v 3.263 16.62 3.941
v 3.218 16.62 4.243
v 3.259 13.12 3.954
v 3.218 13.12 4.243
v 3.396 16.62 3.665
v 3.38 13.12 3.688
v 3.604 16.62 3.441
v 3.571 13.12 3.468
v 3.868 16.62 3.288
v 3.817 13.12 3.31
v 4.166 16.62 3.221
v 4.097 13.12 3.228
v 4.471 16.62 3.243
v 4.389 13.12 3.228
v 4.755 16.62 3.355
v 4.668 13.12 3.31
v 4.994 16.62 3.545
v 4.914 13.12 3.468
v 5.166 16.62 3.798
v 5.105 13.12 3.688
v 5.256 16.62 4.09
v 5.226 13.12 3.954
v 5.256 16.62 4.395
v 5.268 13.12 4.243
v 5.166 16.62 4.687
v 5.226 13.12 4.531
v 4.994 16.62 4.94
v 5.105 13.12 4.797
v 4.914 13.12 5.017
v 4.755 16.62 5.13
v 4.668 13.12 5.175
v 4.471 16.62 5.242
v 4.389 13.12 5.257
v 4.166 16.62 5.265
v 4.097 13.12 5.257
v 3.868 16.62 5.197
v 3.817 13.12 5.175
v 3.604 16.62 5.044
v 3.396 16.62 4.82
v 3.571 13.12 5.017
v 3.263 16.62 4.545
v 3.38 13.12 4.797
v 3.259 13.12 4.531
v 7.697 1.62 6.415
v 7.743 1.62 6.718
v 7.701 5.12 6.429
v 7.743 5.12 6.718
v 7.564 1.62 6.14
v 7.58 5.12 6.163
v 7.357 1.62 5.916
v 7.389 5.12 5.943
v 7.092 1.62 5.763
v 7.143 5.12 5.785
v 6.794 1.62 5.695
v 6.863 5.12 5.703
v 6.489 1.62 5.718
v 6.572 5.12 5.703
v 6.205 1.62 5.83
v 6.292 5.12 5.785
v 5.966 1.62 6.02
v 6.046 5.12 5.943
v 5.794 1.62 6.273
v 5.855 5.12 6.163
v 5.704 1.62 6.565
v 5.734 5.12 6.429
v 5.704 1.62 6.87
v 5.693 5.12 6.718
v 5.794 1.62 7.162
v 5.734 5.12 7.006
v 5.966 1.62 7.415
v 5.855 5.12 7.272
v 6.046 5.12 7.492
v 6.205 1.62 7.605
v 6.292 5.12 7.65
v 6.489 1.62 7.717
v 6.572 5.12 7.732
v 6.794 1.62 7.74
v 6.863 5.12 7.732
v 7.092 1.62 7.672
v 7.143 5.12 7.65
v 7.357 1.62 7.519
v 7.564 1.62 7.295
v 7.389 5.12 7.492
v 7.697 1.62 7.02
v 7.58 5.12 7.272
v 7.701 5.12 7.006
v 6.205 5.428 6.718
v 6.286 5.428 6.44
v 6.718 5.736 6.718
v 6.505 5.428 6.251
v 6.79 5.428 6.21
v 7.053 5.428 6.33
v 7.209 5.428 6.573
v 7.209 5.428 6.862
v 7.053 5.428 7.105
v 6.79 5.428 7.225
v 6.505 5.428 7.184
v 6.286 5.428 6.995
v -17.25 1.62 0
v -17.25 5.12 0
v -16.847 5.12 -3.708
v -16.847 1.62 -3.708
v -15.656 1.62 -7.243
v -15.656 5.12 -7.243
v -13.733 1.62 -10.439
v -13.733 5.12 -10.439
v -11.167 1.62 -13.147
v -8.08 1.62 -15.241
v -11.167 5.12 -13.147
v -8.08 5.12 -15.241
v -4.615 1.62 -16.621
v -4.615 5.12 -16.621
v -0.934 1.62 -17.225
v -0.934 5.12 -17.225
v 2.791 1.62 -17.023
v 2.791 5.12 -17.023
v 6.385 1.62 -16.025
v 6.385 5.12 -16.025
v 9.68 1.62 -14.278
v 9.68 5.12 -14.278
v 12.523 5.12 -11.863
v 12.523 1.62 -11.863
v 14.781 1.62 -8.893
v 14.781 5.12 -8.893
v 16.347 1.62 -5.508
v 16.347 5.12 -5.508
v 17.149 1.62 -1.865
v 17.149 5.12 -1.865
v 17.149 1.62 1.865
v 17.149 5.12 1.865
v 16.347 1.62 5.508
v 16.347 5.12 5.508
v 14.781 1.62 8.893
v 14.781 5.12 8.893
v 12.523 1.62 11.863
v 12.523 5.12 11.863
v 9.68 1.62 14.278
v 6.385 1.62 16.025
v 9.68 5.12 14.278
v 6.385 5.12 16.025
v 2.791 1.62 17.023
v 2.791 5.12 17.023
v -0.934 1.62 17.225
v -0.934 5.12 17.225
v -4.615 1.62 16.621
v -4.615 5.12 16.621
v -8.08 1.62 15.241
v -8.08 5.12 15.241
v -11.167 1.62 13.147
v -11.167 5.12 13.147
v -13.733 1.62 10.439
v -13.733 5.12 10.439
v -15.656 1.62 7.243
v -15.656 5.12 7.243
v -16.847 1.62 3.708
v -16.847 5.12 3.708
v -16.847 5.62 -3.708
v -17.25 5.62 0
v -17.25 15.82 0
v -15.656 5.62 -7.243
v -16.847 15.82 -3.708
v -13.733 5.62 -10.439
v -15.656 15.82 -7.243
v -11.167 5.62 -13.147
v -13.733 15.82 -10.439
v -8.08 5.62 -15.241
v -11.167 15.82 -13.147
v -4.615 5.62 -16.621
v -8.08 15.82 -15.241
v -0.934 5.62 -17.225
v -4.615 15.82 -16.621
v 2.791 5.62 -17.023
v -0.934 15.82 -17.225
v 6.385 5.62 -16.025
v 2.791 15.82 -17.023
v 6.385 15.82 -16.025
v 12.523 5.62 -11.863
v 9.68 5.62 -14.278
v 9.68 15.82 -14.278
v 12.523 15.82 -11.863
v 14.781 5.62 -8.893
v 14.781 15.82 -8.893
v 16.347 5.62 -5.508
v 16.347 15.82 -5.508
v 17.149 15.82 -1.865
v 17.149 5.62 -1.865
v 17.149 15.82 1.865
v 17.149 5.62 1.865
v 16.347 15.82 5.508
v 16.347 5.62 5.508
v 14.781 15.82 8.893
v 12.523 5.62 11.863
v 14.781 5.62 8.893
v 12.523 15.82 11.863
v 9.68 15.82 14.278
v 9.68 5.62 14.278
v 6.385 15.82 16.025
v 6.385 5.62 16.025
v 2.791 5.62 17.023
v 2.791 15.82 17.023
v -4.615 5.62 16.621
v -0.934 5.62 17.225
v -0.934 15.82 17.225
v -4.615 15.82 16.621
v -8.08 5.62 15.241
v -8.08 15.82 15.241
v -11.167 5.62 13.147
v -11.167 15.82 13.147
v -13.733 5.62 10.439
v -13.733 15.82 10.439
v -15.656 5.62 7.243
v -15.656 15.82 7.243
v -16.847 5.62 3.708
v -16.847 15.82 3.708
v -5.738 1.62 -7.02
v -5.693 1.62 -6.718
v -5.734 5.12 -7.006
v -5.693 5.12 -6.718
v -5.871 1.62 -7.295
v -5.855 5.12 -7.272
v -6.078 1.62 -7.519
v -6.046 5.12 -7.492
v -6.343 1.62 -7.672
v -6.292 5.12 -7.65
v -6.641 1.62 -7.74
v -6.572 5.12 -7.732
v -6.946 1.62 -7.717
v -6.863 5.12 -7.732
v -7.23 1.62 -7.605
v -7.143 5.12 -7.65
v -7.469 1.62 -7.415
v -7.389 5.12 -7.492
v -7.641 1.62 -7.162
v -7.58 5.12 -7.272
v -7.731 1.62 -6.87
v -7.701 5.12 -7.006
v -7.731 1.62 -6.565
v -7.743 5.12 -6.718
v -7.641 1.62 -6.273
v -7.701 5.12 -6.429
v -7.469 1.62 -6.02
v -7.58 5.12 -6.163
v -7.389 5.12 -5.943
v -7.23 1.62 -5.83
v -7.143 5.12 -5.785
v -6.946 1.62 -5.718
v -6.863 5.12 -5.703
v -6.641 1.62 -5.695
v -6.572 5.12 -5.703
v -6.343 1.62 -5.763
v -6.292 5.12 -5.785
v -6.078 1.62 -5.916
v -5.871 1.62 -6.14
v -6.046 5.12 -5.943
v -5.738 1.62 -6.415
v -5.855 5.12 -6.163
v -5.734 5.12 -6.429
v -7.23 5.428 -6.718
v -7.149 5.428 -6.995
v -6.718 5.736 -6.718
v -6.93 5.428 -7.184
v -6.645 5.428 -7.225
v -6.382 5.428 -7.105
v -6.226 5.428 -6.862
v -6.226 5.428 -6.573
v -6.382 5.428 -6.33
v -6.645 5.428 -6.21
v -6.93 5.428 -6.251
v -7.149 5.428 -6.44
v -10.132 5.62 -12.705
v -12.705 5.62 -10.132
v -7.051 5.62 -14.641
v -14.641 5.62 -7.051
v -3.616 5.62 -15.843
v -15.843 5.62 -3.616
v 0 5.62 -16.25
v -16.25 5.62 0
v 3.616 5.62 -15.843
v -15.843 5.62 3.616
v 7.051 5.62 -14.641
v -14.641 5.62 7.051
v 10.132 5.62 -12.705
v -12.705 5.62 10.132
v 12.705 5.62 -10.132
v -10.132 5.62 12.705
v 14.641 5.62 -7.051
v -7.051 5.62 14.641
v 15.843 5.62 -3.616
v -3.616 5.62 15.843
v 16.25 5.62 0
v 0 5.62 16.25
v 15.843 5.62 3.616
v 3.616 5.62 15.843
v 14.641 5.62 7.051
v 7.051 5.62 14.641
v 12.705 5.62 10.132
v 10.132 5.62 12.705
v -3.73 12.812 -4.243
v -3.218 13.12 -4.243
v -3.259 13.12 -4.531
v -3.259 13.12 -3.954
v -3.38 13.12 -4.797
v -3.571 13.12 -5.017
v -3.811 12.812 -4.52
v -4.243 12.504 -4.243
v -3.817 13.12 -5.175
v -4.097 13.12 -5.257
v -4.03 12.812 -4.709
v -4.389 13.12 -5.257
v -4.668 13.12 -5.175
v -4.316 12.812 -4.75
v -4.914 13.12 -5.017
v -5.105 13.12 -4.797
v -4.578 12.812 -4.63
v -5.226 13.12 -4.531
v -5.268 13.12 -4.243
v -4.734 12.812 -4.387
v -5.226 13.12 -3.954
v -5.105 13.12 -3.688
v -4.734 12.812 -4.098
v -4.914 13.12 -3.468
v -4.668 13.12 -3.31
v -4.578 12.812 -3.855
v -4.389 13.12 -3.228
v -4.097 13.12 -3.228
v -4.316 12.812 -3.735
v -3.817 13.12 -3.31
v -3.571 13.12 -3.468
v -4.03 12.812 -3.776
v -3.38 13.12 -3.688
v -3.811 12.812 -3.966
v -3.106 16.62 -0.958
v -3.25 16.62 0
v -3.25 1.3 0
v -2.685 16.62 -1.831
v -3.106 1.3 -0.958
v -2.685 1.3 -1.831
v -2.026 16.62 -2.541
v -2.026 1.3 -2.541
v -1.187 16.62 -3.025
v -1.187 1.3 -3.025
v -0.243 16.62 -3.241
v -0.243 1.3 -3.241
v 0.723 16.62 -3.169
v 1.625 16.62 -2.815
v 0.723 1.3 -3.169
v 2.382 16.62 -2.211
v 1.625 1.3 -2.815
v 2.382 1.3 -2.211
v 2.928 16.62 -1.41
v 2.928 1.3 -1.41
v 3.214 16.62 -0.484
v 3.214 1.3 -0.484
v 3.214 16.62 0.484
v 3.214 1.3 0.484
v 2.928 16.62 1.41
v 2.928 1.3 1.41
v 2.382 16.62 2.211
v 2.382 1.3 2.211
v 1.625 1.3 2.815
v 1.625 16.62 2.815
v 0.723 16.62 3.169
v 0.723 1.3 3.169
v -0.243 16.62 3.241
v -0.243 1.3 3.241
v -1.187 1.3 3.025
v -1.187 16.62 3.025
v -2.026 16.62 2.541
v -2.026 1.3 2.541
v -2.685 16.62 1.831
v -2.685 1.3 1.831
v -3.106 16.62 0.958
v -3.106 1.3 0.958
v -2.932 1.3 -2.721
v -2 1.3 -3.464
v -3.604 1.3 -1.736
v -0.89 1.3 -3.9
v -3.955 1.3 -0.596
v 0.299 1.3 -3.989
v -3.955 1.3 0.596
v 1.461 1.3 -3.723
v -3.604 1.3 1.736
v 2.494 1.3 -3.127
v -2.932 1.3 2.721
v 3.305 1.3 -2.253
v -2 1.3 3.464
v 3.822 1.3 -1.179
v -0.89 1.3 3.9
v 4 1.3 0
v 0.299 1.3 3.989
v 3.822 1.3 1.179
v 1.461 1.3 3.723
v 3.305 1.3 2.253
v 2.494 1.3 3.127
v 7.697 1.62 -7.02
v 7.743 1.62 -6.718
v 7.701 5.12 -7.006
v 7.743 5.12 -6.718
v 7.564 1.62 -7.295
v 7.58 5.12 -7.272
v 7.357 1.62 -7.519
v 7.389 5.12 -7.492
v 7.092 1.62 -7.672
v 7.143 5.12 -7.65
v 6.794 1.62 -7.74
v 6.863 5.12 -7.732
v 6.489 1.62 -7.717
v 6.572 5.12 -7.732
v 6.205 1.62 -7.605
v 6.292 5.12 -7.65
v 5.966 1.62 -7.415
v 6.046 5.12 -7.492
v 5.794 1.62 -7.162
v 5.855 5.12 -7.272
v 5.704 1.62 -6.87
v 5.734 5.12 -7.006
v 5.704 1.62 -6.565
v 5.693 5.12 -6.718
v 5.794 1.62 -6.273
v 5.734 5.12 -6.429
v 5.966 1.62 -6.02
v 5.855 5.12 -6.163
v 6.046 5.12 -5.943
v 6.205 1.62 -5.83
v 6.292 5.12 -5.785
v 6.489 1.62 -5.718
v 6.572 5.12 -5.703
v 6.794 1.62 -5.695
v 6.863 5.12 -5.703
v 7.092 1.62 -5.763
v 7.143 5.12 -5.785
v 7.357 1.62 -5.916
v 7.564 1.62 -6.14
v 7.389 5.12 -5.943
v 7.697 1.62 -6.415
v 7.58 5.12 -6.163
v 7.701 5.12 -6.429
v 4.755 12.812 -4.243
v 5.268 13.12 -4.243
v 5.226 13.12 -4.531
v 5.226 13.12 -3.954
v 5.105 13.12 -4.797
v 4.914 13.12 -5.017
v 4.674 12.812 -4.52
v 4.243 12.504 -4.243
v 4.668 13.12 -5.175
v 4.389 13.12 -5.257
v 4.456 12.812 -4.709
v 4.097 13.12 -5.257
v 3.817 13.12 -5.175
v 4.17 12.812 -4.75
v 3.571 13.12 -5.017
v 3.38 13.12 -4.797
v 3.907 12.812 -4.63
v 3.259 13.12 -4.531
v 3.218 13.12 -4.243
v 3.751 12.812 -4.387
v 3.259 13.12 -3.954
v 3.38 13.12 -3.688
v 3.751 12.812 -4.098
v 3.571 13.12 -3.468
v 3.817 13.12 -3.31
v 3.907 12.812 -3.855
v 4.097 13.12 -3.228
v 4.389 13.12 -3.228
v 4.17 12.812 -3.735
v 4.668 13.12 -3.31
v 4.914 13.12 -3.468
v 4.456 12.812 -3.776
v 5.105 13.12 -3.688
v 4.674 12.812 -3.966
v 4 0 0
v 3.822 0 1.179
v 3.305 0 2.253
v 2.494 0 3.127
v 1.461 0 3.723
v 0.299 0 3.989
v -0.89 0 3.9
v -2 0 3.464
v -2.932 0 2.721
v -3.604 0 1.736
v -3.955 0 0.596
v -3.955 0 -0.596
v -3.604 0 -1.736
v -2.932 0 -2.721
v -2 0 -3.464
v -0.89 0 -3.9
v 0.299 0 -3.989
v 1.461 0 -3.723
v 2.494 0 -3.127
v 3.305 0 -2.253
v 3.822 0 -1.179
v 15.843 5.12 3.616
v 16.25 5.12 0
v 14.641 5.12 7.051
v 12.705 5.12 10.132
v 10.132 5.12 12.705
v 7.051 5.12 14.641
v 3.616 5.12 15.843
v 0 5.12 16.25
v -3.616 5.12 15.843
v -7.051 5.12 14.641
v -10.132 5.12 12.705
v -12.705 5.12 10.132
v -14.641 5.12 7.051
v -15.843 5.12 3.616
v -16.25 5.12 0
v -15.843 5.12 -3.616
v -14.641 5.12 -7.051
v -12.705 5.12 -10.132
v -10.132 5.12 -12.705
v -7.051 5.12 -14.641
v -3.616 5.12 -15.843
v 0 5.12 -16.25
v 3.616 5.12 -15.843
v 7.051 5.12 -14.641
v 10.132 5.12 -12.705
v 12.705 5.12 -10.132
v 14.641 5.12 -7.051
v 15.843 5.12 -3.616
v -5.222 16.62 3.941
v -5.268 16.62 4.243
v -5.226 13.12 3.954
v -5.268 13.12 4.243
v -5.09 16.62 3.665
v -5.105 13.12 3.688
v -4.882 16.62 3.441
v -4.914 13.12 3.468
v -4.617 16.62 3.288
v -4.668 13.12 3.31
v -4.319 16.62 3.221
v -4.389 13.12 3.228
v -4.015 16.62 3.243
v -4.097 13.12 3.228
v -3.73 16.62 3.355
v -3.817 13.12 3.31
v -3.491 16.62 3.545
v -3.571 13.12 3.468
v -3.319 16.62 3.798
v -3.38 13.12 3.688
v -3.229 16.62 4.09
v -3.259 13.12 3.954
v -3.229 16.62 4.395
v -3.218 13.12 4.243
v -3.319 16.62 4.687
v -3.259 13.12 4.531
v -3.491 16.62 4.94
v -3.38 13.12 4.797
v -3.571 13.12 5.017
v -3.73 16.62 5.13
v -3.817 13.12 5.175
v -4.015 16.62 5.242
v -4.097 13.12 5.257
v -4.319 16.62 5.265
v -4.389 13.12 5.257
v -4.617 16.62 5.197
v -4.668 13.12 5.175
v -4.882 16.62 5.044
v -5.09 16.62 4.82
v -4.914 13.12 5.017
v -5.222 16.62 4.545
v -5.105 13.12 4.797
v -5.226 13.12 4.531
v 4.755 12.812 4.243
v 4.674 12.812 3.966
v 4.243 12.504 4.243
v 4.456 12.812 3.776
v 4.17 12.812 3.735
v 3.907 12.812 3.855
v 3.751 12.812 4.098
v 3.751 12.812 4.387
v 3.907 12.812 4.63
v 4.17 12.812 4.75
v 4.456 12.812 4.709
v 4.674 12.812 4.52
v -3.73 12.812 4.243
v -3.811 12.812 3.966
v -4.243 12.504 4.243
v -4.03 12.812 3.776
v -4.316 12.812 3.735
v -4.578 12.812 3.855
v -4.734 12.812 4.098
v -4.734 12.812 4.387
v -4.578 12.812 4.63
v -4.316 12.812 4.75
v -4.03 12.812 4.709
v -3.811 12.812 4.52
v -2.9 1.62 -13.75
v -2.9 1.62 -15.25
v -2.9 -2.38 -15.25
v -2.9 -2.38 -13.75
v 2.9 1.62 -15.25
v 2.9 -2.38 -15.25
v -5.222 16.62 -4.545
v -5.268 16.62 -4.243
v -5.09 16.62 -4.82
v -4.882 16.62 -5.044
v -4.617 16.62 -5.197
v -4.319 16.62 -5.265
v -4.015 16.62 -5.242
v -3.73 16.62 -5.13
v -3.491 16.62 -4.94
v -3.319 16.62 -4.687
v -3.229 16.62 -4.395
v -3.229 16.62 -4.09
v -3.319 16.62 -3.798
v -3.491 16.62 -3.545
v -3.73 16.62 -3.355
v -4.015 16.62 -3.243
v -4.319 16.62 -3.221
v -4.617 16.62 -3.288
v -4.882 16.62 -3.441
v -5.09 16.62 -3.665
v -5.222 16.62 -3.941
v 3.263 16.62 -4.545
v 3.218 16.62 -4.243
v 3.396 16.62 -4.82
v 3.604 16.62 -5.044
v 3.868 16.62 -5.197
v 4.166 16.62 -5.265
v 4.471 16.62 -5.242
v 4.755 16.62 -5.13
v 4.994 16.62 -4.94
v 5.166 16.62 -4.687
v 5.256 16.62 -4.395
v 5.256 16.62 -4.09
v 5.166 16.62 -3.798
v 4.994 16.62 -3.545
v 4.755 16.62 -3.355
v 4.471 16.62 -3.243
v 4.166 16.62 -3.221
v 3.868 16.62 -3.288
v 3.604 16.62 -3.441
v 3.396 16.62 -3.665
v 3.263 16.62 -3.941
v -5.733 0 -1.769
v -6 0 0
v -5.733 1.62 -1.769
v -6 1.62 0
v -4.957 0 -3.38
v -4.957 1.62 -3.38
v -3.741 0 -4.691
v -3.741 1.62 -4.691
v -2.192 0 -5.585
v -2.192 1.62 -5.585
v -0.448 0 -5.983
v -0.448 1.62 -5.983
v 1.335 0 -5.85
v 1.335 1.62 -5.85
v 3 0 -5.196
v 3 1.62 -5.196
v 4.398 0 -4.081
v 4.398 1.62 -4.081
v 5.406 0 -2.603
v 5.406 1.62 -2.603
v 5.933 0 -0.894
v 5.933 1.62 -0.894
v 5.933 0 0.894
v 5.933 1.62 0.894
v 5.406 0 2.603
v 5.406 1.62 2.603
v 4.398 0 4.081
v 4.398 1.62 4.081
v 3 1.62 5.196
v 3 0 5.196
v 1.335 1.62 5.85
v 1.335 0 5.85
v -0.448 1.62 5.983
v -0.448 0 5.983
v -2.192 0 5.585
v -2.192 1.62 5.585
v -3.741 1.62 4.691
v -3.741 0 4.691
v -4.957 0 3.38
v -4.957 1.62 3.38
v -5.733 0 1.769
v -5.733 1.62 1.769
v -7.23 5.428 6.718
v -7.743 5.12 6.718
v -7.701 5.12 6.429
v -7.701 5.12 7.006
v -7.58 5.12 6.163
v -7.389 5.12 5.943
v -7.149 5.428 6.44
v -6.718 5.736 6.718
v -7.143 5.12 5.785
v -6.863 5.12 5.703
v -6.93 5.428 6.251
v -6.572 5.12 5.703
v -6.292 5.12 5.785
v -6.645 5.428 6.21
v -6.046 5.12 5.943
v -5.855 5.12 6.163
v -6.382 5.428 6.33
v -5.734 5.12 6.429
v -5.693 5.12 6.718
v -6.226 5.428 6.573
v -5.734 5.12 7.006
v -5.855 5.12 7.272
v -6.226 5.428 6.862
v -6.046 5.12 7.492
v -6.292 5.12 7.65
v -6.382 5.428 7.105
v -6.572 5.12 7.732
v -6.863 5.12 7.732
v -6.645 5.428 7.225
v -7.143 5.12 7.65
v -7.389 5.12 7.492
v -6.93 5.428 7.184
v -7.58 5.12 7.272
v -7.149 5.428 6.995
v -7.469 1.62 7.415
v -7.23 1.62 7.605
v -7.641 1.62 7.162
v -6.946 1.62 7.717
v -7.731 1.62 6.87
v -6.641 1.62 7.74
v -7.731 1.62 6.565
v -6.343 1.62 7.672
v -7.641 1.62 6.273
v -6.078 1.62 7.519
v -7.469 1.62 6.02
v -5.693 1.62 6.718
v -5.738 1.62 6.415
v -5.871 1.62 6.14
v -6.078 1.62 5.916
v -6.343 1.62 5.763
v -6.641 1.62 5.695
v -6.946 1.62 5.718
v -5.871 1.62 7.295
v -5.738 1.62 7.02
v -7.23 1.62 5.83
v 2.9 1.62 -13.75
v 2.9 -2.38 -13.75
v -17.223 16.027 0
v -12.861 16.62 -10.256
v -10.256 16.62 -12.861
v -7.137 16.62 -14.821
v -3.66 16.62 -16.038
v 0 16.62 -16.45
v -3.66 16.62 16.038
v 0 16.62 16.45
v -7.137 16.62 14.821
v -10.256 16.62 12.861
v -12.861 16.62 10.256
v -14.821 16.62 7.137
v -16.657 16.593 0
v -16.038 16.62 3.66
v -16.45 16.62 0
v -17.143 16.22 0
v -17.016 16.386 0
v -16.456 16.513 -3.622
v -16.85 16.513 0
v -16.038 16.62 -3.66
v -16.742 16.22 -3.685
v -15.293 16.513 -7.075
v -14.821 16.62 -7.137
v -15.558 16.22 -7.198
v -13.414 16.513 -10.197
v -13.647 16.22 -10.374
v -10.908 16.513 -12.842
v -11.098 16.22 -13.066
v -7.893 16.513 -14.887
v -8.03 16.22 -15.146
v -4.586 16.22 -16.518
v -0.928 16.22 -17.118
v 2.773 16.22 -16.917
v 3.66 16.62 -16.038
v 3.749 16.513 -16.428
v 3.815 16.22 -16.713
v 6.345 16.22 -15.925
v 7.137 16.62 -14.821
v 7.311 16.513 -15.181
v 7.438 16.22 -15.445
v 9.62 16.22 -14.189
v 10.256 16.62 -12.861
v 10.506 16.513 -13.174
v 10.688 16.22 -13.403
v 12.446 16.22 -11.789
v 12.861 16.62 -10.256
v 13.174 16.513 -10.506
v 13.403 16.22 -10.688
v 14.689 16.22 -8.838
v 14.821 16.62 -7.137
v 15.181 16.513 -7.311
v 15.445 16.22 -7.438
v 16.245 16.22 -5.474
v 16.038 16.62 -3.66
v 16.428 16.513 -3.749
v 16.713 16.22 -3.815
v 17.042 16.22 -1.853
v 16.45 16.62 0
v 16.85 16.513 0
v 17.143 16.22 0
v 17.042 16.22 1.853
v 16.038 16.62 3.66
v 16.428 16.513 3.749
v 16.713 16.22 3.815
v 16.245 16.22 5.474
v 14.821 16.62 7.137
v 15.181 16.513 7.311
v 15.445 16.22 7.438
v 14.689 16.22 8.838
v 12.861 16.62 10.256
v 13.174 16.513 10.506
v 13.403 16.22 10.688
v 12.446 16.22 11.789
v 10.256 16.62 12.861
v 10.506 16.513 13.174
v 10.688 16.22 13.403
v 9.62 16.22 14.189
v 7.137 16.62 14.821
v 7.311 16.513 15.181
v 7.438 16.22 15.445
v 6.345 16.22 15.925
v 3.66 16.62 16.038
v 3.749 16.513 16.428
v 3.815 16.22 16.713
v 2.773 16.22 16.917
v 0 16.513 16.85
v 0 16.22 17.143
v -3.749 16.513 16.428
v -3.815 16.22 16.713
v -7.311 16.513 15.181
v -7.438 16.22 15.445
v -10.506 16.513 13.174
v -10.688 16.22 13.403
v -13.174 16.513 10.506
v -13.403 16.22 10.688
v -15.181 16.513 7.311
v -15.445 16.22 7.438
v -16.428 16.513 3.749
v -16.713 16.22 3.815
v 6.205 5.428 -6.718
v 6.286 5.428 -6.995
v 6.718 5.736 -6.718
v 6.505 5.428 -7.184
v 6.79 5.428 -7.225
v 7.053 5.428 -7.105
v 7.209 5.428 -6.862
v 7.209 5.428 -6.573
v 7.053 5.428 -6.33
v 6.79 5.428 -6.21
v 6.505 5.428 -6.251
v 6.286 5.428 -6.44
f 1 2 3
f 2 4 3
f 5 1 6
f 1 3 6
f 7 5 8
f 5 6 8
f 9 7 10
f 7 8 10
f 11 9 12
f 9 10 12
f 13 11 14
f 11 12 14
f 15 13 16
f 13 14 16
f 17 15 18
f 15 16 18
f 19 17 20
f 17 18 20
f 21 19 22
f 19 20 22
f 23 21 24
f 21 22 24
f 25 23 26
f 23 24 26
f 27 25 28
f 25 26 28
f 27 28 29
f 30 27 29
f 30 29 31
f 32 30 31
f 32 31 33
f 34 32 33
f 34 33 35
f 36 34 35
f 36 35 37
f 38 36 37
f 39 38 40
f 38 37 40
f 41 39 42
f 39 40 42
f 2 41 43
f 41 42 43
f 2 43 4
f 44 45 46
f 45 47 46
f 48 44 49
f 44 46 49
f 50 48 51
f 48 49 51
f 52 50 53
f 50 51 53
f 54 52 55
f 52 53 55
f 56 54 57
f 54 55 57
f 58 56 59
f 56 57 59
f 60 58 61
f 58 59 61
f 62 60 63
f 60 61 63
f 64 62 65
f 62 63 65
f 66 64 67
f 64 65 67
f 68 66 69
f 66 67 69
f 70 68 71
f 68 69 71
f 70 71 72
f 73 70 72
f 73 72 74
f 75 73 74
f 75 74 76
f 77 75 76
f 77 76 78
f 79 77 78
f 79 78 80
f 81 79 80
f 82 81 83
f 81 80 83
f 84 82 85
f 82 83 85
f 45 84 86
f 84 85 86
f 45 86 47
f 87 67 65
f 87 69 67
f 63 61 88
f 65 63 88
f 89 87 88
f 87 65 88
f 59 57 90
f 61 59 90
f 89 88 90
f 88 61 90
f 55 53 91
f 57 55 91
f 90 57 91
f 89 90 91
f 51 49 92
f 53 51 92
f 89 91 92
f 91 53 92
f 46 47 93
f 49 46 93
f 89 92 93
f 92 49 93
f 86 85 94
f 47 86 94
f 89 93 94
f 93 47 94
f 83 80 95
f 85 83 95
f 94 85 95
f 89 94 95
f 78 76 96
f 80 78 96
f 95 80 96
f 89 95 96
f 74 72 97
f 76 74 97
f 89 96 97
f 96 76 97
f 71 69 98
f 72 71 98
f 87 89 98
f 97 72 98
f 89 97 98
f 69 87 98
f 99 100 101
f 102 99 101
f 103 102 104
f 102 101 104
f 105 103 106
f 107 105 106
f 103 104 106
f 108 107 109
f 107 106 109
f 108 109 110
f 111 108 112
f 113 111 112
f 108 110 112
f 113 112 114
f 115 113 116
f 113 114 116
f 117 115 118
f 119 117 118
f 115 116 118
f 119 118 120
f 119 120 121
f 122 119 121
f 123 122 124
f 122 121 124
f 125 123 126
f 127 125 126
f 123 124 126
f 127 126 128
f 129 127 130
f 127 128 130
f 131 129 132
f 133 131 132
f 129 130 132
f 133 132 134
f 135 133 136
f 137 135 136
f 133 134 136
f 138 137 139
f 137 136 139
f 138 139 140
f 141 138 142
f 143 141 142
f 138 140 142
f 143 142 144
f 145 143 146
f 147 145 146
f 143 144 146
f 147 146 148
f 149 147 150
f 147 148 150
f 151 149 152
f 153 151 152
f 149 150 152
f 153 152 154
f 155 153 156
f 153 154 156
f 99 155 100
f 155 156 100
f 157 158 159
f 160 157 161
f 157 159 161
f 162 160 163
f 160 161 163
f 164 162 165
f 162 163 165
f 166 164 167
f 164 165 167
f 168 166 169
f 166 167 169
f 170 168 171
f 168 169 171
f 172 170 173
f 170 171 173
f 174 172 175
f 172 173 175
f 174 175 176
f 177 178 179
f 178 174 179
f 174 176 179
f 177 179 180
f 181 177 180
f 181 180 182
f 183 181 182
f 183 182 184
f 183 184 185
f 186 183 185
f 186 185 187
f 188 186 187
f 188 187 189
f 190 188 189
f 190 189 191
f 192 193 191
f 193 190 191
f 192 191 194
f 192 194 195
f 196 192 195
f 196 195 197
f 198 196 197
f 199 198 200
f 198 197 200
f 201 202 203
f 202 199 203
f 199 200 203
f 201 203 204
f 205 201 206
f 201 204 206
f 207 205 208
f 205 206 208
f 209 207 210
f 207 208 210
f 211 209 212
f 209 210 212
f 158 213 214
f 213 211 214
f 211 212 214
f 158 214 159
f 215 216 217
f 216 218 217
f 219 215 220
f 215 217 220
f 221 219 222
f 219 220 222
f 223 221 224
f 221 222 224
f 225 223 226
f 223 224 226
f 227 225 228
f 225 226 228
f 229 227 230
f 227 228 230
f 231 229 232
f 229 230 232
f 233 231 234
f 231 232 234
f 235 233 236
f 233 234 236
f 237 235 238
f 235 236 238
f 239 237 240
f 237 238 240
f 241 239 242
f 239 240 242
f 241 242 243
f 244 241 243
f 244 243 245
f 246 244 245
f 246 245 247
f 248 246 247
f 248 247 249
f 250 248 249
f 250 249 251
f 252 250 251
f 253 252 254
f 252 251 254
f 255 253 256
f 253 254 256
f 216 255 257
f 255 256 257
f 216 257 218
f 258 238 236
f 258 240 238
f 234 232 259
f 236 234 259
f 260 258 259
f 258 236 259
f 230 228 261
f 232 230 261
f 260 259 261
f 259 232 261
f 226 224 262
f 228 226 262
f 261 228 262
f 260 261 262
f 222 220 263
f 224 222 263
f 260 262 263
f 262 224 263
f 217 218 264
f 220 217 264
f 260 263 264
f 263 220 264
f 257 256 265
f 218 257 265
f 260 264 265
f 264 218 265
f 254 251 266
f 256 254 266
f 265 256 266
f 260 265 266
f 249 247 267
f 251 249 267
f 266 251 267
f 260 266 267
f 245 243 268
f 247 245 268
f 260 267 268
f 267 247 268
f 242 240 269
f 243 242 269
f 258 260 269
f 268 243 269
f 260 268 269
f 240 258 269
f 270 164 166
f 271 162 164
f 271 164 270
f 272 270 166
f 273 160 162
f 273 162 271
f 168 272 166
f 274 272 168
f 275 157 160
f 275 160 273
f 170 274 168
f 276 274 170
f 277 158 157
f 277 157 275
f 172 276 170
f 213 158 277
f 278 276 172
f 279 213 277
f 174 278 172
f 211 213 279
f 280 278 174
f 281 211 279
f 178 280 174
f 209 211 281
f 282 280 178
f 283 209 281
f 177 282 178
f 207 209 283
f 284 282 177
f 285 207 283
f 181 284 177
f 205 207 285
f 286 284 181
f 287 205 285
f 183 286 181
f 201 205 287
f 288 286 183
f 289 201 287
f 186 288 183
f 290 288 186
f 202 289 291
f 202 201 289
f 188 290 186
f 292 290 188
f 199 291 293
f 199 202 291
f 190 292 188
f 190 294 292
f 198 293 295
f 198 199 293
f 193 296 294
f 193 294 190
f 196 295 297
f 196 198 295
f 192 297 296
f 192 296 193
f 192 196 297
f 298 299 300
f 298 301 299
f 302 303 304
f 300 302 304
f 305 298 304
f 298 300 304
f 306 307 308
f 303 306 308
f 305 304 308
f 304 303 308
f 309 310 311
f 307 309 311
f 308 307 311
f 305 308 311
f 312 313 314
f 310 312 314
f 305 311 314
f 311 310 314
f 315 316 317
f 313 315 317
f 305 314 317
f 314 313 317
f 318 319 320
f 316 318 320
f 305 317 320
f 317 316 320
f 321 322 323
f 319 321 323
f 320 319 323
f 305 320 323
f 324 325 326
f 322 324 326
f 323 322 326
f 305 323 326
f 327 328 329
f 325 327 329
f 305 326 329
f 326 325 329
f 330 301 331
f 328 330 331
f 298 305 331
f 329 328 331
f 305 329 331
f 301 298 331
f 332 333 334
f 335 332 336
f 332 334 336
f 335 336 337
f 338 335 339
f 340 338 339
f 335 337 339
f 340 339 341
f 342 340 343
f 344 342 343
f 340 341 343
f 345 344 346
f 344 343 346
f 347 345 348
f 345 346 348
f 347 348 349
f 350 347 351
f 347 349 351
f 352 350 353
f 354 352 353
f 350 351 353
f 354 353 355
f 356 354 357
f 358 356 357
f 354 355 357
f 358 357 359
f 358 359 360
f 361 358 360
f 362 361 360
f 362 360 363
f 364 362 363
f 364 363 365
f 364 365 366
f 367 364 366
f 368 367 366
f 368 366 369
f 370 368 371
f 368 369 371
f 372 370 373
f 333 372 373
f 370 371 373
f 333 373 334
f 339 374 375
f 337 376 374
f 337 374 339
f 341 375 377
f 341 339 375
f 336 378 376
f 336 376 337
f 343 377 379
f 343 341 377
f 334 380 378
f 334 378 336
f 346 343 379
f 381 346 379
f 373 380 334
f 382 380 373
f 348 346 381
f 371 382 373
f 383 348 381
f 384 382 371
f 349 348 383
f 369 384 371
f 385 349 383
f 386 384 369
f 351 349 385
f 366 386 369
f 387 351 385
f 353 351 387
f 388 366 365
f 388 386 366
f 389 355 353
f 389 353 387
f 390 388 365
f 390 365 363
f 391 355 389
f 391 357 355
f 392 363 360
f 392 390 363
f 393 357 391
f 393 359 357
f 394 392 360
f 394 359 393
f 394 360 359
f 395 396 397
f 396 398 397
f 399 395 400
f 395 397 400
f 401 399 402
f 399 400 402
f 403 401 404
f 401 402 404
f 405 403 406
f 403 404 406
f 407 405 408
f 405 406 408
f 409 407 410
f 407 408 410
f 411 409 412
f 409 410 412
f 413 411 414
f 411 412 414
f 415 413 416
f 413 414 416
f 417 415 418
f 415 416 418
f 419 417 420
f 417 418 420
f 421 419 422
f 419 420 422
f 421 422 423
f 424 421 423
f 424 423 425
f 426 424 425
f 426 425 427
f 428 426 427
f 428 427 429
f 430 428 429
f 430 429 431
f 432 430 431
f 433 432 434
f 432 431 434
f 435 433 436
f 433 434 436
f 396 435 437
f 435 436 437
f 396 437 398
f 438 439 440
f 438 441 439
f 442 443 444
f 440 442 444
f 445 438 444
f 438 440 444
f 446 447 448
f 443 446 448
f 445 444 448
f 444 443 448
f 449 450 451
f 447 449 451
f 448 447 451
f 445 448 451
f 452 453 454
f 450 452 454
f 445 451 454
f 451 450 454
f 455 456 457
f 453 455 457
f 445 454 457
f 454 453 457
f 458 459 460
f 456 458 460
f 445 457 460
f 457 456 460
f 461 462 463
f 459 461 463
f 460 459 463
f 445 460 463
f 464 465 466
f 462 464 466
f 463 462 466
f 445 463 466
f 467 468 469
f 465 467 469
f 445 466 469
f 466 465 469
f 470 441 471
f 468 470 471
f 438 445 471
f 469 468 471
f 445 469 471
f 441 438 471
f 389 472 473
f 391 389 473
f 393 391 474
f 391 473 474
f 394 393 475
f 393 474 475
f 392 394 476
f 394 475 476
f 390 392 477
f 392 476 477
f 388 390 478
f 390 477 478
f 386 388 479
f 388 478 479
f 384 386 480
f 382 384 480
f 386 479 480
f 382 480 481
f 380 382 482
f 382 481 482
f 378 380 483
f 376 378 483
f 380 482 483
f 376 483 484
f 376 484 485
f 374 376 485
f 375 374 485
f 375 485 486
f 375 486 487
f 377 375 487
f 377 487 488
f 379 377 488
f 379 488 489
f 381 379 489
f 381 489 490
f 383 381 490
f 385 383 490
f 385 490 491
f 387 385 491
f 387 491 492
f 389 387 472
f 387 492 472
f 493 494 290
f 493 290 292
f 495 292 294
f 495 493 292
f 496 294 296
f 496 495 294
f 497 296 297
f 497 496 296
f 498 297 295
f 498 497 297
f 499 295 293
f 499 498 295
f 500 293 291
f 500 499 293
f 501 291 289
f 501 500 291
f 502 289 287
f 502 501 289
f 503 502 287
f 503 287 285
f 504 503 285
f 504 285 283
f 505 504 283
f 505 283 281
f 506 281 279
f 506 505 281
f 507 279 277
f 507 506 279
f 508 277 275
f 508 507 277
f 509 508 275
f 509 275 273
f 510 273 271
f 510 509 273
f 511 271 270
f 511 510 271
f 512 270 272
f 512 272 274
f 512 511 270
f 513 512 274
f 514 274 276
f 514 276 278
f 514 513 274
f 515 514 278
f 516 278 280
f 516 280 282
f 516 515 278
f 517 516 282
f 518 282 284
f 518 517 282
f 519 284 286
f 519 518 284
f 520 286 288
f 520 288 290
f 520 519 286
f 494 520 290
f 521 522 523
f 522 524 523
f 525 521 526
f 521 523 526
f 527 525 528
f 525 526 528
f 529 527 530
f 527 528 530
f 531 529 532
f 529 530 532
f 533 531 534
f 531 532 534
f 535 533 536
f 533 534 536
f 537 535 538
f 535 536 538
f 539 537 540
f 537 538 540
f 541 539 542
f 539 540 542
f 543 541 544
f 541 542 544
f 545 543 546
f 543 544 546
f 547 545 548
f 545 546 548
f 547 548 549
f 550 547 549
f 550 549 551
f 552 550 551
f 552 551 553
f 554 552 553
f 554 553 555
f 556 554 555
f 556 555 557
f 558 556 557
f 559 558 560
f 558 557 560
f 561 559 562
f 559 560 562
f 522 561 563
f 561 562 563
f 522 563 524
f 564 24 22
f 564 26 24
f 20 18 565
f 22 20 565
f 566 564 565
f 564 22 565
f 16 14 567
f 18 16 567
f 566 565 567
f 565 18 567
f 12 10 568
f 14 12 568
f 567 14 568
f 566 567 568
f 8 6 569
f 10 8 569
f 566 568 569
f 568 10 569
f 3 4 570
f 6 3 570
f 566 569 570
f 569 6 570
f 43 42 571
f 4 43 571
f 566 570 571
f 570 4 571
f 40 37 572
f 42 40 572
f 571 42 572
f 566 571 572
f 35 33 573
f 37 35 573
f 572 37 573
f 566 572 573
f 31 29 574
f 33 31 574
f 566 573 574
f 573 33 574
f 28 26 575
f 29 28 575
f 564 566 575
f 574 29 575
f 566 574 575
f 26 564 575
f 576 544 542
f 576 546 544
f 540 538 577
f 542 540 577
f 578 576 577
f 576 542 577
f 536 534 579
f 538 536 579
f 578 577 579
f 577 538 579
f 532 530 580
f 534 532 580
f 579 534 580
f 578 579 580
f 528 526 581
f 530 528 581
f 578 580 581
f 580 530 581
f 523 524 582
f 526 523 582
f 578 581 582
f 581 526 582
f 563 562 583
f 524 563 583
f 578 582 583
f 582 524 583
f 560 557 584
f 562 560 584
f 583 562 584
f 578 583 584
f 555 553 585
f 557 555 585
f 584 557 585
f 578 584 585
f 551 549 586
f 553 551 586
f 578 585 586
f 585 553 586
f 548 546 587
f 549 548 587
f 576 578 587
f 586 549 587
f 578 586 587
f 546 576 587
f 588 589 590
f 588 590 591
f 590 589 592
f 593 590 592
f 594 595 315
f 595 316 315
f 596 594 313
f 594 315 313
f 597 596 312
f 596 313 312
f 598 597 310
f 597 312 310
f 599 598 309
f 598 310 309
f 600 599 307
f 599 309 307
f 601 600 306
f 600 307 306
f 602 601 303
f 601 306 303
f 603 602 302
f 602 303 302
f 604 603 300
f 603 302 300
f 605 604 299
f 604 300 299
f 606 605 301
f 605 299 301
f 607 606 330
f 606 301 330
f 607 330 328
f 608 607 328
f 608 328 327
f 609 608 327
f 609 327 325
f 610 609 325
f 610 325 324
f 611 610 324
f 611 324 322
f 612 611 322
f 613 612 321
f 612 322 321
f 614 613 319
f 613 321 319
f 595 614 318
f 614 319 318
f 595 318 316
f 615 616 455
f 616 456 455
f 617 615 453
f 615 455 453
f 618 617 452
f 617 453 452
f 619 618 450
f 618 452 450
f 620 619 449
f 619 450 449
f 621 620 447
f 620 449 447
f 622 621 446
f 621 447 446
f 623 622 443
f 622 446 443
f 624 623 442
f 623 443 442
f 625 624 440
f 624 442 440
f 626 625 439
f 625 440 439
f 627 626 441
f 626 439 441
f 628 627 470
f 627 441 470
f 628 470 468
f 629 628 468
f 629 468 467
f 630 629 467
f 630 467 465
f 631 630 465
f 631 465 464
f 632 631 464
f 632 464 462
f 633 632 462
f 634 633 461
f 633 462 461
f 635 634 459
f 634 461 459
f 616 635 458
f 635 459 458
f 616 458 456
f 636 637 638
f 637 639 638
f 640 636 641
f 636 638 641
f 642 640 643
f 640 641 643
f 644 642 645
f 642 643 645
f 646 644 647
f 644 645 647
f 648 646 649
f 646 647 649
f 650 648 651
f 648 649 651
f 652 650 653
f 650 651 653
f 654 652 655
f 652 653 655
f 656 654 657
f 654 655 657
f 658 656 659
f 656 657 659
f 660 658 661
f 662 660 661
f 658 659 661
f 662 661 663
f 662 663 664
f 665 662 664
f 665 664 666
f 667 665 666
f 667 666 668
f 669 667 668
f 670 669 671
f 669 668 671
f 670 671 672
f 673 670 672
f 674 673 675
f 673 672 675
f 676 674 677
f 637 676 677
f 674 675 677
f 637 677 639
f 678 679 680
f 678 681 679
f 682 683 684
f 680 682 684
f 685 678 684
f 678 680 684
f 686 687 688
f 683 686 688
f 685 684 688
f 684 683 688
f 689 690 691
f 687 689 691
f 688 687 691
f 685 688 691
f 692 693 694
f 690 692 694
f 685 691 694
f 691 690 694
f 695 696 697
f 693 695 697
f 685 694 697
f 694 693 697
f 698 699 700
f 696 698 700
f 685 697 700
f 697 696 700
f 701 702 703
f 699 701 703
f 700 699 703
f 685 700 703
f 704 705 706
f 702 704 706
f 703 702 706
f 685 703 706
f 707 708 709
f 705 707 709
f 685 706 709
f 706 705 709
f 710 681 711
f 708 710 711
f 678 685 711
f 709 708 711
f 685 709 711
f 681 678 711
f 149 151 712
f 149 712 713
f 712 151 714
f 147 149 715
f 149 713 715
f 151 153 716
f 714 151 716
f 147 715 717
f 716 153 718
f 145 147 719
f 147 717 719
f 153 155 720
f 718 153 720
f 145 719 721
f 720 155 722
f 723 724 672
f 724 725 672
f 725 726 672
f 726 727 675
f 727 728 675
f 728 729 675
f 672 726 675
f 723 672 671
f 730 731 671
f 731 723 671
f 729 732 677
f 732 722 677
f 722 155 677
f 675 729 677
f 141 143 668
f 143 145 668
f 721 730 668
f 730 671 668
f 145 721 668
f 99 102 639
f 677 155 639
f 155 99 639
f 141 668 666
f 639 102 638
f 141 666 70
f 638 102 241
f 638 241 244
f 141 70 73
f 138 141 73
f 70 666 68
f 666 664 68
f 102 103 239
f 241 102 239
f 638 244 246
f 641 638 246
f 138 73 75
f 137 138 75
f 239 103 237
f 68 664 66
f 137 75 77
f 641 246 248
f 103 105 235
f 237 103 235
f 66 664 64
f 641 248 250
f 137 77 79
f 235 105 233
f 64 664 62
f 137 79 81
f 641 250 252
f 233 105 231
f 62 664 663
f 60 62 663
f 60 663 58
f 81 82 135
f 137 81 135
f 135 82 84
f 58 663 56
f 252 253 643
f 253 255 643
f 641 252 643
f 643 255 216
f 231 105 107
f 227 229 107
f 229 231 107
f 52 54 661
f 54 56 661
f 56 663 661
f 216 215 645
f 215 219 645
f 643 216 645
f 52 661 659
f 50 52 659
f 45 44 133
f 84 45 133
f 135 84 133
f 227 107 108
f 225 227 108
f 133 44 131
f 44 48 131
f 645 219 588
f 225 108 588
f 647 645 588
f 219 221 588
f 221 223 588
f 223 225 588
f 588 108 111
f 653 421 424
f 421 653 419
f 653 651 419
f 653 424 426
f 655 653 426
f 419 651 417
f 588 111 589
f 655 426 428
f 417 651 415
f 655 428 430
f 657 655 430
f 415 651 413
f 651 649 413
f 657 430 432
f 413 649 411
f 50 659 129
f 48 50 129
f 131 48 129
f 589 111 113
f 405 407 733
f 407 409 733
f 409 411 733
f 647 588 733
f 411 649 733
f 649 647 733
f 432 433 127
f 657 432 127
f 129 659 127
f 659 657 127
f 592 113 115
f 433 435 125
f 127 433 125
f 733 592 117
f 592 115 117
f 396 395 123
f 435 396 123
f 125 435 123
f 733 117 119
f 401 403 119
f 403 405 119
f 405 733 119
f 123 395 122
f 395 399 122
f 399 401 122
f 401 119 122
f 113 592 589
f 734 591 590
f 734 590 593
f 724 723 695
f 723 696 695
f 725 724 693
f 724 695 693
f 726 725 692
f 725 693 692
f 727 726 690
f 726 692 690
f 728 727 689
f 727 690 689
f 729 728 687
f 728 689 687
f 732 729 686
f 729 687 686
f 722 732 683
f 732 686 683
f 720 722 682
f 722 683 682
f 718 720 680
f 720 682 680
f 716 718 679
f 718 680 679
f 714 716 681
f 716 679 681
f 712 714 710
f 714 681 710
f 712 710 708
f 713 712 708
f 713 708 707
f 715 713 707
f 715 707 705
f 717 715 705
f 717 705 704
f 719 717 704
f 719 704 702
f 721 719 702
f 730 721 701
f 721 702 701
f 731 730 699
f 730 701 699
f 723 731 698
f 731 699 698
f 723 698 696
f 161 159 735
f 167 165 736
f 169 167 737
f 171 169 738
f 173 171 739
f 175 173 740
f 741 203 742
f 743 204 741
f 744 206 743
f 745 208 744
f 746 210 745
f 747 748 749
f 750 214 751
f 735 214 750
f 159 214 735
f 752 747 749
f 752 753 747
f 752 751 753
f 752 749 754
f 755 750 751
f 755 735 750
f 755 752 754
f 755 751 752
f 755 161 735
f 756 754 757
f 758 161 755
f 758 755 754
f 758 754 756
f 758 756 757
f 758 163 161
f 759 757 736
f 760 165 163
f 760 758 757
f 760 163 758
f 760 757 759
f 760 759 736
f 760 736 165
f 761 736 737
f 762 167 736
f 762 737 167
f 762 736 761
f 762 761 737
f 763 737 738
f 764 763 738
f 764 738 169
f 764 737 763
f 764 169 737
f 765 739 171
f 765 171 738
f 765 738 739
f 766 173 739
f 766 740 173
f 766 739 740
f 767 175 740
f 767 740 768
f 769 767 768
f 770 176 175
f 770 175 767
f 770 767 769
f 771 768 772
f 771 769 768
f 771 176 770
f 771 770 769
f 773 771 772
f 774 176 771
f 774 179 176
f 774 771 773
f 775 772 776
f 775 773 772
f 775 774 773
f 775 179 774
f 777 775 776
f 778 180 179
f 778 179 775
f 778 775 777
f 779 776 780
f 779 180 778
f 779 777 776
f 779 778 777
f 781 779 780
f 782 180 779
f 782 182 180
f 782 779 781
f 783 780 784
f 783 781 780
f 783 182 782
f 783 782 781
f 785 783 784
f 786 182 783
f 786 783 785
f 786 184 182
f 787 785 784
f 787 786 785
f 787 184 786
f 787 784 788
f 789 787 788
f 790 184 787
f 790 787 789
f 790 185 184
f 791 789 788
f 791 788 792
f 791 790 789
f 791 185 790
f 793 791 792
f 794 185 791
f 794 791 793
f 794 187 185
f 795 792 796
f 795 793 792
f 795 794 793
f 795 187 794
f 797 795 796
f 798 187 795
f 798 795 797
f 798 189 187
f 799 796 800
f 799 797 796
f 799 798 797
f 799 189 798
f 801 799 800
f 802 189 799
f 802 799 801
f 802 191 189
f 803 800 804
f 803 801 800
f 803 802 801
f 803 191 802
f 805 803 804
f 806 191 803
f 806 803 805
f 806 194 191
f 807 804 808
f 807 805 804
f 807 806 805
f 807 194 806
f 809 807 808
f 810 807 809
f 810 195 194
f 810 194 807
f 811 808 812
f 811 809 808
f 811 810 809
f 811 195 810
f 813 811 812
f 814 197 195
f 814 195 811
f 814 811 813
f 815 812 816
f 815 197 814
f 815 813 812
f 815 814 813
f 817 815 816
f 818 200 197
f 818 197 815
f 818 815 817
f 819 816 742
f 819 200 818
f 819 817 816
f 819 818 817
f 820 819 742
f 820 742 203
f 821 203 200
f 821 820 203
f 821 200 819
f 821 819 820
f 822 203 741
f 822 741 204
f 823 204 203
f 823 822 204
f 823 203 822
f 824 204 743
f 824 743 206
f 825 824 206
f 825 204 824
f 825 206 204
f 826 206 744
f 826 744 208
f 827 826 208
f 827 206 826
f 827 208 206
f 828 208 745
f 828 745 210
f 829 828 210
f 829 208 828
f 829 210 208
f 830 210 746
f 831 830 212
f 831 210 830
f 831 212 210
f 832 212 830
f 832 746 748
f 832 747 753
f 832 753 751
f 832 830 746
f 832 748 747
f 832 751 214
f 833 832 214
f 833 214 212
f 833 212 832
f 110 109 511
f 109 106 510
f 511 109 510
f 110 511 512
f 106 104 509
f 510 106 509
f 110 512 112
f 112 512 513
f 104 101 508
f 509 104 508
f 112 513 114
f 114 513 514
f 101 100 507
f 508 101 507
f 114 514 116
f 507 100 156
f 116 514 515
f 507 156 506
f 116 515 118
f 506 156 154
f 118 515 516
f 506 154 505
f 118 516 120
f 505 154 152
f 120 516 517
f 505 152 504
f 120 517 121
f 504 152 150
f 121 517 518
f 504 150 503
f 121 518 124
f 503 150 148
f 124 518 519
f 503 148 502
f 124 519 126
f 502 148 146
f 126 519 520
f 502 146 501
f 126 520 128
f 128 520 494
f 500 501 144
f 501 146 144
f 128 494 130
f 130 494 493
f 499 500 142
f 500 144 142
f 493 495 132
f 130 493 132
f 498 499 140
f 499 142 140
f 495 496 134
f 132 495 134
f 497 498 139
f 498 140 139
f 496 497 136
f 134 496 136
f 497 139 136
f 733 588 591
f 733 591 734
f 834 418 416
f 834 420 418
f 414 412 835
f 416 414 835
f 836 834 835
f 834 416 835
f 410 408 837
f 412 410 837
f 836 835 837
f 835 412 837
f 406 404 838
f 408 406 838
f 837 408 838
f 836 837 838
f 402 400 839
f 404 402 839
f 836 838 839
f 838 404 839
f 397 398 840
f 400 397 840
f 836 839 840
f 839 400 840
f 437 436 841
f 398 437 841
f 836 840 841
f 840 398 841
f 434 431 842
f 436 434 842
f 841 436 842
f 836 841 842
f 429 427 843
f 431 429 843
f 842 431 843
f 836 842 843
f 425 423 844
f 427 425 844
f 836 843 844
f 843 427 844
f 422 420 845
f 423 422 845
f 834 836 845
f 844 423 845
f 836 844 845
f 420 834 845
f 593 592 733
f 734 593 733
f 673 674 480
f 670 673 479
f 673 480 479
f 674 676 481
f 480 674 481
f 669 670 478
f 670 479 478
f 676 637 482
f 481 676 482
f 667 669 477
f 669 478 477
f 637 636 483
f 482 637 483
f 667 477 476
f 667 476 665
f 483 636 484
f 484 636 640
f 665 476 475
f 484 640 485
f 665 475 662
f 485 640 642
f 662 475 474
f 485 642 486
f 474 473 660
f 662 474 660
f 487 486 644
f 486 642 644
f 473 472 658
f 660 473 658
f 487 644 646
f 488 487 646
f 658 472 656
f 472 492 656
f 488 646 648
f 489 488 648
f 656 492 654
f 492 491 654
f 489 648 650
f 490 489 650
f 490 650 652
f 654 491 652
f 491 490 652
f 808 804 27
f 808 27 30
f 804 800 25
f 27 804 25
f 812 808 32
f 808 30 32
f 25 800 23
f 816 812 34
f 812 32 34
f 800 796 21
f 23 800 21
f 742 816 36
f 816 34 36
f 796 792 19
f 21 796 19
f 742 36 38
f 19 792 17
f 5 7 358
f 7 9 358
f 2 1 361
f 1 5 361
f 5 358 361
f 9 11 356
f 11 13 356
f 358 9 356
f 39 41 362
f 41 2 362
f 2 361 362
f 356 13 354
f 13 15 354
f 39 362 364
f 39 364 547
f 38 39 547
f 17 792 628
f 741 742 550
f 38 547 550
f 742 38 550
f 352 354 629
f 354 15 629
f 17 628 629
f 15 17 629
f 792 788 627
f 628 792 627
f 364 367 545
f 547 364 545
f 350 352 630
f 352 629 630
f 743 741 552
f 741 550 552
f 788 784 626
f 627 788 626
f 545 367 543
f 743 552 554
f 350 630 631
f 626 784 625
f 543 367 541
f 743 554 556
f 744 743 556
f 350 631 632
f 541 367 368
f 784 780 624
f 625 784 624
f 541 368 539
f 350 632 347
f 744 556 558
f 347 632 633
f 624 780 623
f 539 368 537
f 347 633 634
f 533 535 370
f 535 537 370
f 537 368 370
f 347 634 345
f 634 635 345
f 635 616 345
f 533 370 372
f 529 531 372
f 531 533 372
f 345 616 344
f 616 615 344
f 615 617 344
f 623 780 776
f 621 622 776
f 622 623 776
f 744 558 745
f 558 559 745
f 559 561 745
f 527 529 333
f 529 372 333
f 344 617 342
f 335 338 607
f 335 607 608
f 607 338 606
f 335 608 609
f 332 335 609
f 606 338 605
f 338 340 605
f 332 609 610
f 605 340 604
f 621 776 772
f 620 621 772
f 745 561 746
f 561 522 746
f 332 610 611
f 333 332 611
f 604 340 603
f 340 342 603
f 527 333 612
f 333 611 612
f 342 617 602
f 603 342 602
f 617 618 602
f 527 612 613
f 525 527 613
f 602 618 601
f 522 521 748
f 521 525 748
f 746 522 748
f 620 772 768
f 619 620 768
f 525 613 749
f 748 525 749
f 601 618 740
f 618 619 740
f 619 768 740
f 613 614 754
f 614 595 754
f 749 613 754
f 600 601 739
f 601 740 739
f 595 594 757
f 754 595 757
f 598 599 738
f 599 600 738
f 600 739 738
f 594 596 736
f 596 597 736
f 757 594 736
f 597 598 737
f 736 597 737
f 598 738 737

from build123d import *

# Parameters (mm, degrees)
CUT_EXTRUDE_START        = -3.5
SKETCH_4_R               = 17.25
SKETCH_4_R_2             = 16.25
CUT_EXTRUDE_1_DEPTH      = 0.5
HOLE_WIZARD_M2_5_2_D     = 2.05
HOLE_WIZARD_M2_5_2_DEPTH = 3.5
HOLE_WIZARD_M2_5_2_TIP   = 0.615882135
SKETCH_9_W               = 5.8
SKETCH_9_H               = 1.5
EXTRUDE_1_DEPTH          = 4
HOLE_WIZARD_M2_5_1_D     = 2.05
HOLE_WIZARD_M2_5_1_DEPTH = 3.5
HOLE_WIZARD_M2_5_1_TIP   = 0.615882135
FILLET_1_R               = 0.8
SKETCH_14_R              = 4
CUT_EXTRUDE_1_2_DEPTH    = 1.3


with BuildPart() as part:
    # 草图1 → 旋转1 (revolve)
    with BuildSketch(Plane.XY):
        Polygon((-6, 0), (-6, 1.62), (-17.25, 1.62), (-17.25, 16.62), (-3.25, 16.62), (-3.25, 0), align=None)
    revolve(axis=Axis((0, 44.719290515, 0), (0, -1, 0)))

    # 草图4 → Cut-Extrude 1 (cut)
    with BuildSketch(Plane.XZ.offset(-1.62).offset(CUT_EXTRUDE_START)):
        Circle(SKETCH_4_R)
        Circle(SKETCH_4_R_2, mode=Mode.SUBTRACT)
    extrude(amount=-CUT_EXTRUDE_1_DEPTH, mode=Mode.SUBTRACT)

    # M2.5 螺纹孔2
    with Locations(Plane(origin=(0, 1.62, 0), x_dir=(-1, 0, 0), z_dir=(0, -1, 0))):
        with Locations((-6.717514421, 6.717514421), (-6.717514421, -6.717514421), (6.717514421, -6.717514421), (6.717514421, 6.717514421)):
            Hole(HOLE_WIZARD_M2_5_2_D / 2, depth=HOLE_WIZARD_M2_5_2_DEPTH)
            with Locations((0, 0, -(HOLE_WIZARD_M2_5_2_DEPTH + HOLE_WIZARD_M2_5_2_TIP / 2))):  # 118° drill point
                Cone(0, HOLE_WIZARD_M2_5_2_D / 2, HOLE_WIZARD_M2_5_2_TIP, mode=Mode.SUBTRACT)

    # 草图9 → 凸台-拉伸1 (add)
    with BuildSketch(Plane.XZ.offset(-1.62)):
        with Locations((0, -14.5)):
            Rectangle(SKETCH_9_W, SKETCH_9_H)
    extrude(amount=EXTRUDE_1_DEPTH)

    # M2.5 螺纹孔1
    with Locations(Plane(origin=(0, 16.62, 0), x_dir=(1, 0, 0), z_dir=(0, 1, 0))):
        with Locations((-4.242640687, 4.242640687), (4.242640687, 4.242640687), (4.242640687, -4.242640687), (-4.242640687, -4.242640687)):
            Hole(HOLE_WIZARD_M2_5_1_D / 2, depth=HOLE_WIZARD_M2_5_1_DEPTH)
            with Locations((0, 0, -(HOLE_WIZARD_M2_5_1_DEPTH + HOLE_WIZARD_M2_5_1_TIP / 2))):  # 118° drill point
                Cone(0, HOLE_WIZARD_M2_5_1_D / 2, HOLE_WIZARD_M2_5_1_TIP, mode=Mode.SUBTRACT)

    # 圆角1
    fillet_1_edges = [part.edges().sort_by_distance(p)[0] for p in [
        (17.25, 16.62, 0),
    ]]
    fillet(fillet_1_edges, radius=FILLET_1_R)

    # 草图14 → Cut-Extrude 1 2 (cut)
    with BuildSketch(Plane.XZ):
        Circle(SKETCH_14_R)
    extrude(amount=-CUT_EXTRUDE_1_2_DEPTH, mode=Mode.SUBTRACT)


solid = part.part
